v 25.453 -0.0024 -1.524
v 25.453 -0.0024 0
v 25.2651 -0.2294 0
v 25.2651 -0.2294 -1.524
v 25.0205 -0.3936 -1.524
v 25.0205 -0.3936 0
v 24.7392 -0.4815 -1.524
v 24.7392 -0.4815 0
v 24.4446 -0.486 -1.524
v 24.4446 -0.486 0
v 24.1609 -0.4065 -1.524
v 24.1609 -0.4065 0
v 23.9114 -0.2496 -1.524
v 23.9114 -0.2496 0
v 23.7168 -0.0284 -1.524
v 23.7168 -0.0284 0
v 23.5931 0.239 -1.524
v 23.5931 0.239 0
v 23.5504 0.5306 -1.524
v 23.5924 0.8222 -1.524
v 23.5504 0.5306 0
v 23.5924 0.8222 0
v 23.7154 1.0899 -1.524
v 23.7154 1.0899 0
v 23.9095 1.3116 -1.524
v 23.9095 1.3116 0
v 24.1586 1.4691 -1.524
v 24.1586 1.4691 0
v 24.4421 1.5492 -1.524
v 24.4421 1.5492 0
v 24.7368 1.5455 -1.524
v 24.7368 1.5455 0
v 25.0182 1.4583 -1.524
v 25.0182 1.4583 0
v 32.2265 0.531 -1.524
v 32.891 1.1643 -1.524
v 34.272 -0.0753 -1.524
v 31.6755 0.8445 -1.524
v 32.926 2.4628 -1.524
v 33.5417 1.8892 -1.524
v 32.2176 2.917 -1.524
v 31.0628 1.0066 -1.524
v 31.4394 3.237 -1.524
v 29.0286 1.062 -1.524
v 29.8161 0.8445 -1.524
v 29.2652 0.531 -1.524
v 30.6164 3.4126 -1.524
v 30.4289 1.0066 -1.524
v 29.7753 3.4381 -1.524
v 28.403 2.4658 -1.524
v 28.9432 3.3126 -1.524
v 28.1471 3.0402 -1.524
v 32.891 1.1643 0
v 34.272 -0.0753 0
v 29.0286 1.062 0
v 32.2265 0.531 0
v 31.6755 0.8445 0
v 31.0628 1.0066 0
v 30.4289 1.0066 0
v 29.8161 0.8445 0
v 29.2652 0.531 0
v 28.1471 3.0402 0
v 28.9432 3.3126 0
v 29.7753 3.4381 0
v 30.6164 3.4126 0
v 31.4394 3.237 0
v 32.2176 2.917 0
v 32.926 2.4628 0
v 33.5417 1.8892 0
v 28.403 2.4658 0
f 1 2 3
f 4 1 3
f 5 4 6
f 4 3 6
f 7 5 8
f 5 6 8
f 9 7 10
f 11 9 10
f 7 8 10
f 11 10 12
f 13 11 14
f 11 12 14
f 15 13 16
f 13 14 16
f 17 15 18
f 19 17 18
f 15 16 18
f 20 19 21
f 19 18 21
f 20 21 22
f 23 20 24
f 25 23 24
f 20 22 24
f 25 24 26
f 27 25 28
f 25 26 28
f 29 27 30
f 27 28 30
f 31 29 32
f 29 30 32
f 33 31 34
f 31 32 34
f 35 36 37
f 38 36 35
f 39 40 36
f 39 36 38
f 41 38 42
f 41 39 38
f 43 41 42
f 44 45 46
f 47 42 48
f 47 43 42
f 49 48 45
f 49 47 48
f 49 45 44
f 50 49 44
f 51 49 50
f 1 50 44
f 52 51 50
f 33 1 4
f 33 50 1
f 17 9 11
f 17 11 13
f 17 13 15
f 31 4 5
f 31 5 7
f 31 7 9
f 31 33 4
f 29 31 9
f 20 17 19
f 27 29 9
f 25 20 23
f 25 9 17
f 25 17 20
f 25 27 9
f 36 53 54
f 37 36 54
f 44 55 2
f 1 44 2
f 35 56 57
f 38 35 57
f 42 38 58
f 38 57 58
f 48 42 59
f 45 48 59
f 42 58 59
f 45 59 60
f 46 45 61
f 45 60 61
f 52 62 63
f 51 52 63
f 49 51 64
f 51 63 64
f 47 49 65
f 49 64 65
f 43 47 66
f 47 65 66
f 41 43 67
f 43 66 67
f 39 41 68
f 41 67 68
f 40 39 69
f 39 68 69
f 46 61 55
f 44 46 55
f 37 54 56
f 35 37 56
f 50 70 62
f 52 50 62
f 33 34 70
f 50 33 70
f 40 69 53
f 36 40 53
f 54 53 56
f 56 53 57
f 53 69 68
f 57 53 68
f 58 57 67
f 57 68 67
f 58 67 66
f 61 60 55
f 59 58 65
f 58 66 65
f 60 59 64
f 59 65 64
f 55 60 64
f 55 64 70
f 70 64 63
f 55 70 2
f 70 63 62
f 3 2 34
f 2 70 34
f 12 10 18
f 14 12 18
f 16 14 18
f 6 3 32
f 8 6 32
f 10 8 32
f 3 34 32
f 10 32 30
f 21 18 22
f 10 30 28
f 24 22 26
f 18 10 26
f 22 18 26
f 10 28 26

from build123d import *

# Parameters (mm, degrees)
BOSS_EXTRUDE1_DEPTH = 1.524


with BuildPart() as part:
    # Sketch1 → Boss-Extrude1 (new body)
    with BuildSketch(Plane.XY):
        with BuildLine():
            Line((25.018211481, 1.458274504), (28.403024501, 2.465831103))
            Line((28.403024501, 2.465831103), (28.147078807, 3.040199114))
            ThreePointArc((28.147078807, 3.040199114), (31.031837949, 3.343352077), (33.541663921, 1.889216381))
            Line((33.541663921, 1.889216381), (32.890976581, 1.164259908))
            Line((32.890976581, 1.164259908), (34.272042889, -0.07532122))
            Line((34.272042889, -0.07532122), (32.226452866, 0.530981017))
            ThreePointArc((32.226452866, 0.530981017), (30.745835594, 1.027103578), (29.265218322, 0.530981017))
            Line((29.265218322, 0.530981017), (29.028606423, 1.061962035))
            Line((29.028606423, 1.061962035), (25.453006053, -0.002386196))
            ThreePointArc((25.453006053, -0.002386196), (23.593059825, 0.239006946), (25.018211481, 1.458274504))
        make_face()
    extrude(amount=-BOSS_EXTRUDE1_DEPTH)


solid = part.part
